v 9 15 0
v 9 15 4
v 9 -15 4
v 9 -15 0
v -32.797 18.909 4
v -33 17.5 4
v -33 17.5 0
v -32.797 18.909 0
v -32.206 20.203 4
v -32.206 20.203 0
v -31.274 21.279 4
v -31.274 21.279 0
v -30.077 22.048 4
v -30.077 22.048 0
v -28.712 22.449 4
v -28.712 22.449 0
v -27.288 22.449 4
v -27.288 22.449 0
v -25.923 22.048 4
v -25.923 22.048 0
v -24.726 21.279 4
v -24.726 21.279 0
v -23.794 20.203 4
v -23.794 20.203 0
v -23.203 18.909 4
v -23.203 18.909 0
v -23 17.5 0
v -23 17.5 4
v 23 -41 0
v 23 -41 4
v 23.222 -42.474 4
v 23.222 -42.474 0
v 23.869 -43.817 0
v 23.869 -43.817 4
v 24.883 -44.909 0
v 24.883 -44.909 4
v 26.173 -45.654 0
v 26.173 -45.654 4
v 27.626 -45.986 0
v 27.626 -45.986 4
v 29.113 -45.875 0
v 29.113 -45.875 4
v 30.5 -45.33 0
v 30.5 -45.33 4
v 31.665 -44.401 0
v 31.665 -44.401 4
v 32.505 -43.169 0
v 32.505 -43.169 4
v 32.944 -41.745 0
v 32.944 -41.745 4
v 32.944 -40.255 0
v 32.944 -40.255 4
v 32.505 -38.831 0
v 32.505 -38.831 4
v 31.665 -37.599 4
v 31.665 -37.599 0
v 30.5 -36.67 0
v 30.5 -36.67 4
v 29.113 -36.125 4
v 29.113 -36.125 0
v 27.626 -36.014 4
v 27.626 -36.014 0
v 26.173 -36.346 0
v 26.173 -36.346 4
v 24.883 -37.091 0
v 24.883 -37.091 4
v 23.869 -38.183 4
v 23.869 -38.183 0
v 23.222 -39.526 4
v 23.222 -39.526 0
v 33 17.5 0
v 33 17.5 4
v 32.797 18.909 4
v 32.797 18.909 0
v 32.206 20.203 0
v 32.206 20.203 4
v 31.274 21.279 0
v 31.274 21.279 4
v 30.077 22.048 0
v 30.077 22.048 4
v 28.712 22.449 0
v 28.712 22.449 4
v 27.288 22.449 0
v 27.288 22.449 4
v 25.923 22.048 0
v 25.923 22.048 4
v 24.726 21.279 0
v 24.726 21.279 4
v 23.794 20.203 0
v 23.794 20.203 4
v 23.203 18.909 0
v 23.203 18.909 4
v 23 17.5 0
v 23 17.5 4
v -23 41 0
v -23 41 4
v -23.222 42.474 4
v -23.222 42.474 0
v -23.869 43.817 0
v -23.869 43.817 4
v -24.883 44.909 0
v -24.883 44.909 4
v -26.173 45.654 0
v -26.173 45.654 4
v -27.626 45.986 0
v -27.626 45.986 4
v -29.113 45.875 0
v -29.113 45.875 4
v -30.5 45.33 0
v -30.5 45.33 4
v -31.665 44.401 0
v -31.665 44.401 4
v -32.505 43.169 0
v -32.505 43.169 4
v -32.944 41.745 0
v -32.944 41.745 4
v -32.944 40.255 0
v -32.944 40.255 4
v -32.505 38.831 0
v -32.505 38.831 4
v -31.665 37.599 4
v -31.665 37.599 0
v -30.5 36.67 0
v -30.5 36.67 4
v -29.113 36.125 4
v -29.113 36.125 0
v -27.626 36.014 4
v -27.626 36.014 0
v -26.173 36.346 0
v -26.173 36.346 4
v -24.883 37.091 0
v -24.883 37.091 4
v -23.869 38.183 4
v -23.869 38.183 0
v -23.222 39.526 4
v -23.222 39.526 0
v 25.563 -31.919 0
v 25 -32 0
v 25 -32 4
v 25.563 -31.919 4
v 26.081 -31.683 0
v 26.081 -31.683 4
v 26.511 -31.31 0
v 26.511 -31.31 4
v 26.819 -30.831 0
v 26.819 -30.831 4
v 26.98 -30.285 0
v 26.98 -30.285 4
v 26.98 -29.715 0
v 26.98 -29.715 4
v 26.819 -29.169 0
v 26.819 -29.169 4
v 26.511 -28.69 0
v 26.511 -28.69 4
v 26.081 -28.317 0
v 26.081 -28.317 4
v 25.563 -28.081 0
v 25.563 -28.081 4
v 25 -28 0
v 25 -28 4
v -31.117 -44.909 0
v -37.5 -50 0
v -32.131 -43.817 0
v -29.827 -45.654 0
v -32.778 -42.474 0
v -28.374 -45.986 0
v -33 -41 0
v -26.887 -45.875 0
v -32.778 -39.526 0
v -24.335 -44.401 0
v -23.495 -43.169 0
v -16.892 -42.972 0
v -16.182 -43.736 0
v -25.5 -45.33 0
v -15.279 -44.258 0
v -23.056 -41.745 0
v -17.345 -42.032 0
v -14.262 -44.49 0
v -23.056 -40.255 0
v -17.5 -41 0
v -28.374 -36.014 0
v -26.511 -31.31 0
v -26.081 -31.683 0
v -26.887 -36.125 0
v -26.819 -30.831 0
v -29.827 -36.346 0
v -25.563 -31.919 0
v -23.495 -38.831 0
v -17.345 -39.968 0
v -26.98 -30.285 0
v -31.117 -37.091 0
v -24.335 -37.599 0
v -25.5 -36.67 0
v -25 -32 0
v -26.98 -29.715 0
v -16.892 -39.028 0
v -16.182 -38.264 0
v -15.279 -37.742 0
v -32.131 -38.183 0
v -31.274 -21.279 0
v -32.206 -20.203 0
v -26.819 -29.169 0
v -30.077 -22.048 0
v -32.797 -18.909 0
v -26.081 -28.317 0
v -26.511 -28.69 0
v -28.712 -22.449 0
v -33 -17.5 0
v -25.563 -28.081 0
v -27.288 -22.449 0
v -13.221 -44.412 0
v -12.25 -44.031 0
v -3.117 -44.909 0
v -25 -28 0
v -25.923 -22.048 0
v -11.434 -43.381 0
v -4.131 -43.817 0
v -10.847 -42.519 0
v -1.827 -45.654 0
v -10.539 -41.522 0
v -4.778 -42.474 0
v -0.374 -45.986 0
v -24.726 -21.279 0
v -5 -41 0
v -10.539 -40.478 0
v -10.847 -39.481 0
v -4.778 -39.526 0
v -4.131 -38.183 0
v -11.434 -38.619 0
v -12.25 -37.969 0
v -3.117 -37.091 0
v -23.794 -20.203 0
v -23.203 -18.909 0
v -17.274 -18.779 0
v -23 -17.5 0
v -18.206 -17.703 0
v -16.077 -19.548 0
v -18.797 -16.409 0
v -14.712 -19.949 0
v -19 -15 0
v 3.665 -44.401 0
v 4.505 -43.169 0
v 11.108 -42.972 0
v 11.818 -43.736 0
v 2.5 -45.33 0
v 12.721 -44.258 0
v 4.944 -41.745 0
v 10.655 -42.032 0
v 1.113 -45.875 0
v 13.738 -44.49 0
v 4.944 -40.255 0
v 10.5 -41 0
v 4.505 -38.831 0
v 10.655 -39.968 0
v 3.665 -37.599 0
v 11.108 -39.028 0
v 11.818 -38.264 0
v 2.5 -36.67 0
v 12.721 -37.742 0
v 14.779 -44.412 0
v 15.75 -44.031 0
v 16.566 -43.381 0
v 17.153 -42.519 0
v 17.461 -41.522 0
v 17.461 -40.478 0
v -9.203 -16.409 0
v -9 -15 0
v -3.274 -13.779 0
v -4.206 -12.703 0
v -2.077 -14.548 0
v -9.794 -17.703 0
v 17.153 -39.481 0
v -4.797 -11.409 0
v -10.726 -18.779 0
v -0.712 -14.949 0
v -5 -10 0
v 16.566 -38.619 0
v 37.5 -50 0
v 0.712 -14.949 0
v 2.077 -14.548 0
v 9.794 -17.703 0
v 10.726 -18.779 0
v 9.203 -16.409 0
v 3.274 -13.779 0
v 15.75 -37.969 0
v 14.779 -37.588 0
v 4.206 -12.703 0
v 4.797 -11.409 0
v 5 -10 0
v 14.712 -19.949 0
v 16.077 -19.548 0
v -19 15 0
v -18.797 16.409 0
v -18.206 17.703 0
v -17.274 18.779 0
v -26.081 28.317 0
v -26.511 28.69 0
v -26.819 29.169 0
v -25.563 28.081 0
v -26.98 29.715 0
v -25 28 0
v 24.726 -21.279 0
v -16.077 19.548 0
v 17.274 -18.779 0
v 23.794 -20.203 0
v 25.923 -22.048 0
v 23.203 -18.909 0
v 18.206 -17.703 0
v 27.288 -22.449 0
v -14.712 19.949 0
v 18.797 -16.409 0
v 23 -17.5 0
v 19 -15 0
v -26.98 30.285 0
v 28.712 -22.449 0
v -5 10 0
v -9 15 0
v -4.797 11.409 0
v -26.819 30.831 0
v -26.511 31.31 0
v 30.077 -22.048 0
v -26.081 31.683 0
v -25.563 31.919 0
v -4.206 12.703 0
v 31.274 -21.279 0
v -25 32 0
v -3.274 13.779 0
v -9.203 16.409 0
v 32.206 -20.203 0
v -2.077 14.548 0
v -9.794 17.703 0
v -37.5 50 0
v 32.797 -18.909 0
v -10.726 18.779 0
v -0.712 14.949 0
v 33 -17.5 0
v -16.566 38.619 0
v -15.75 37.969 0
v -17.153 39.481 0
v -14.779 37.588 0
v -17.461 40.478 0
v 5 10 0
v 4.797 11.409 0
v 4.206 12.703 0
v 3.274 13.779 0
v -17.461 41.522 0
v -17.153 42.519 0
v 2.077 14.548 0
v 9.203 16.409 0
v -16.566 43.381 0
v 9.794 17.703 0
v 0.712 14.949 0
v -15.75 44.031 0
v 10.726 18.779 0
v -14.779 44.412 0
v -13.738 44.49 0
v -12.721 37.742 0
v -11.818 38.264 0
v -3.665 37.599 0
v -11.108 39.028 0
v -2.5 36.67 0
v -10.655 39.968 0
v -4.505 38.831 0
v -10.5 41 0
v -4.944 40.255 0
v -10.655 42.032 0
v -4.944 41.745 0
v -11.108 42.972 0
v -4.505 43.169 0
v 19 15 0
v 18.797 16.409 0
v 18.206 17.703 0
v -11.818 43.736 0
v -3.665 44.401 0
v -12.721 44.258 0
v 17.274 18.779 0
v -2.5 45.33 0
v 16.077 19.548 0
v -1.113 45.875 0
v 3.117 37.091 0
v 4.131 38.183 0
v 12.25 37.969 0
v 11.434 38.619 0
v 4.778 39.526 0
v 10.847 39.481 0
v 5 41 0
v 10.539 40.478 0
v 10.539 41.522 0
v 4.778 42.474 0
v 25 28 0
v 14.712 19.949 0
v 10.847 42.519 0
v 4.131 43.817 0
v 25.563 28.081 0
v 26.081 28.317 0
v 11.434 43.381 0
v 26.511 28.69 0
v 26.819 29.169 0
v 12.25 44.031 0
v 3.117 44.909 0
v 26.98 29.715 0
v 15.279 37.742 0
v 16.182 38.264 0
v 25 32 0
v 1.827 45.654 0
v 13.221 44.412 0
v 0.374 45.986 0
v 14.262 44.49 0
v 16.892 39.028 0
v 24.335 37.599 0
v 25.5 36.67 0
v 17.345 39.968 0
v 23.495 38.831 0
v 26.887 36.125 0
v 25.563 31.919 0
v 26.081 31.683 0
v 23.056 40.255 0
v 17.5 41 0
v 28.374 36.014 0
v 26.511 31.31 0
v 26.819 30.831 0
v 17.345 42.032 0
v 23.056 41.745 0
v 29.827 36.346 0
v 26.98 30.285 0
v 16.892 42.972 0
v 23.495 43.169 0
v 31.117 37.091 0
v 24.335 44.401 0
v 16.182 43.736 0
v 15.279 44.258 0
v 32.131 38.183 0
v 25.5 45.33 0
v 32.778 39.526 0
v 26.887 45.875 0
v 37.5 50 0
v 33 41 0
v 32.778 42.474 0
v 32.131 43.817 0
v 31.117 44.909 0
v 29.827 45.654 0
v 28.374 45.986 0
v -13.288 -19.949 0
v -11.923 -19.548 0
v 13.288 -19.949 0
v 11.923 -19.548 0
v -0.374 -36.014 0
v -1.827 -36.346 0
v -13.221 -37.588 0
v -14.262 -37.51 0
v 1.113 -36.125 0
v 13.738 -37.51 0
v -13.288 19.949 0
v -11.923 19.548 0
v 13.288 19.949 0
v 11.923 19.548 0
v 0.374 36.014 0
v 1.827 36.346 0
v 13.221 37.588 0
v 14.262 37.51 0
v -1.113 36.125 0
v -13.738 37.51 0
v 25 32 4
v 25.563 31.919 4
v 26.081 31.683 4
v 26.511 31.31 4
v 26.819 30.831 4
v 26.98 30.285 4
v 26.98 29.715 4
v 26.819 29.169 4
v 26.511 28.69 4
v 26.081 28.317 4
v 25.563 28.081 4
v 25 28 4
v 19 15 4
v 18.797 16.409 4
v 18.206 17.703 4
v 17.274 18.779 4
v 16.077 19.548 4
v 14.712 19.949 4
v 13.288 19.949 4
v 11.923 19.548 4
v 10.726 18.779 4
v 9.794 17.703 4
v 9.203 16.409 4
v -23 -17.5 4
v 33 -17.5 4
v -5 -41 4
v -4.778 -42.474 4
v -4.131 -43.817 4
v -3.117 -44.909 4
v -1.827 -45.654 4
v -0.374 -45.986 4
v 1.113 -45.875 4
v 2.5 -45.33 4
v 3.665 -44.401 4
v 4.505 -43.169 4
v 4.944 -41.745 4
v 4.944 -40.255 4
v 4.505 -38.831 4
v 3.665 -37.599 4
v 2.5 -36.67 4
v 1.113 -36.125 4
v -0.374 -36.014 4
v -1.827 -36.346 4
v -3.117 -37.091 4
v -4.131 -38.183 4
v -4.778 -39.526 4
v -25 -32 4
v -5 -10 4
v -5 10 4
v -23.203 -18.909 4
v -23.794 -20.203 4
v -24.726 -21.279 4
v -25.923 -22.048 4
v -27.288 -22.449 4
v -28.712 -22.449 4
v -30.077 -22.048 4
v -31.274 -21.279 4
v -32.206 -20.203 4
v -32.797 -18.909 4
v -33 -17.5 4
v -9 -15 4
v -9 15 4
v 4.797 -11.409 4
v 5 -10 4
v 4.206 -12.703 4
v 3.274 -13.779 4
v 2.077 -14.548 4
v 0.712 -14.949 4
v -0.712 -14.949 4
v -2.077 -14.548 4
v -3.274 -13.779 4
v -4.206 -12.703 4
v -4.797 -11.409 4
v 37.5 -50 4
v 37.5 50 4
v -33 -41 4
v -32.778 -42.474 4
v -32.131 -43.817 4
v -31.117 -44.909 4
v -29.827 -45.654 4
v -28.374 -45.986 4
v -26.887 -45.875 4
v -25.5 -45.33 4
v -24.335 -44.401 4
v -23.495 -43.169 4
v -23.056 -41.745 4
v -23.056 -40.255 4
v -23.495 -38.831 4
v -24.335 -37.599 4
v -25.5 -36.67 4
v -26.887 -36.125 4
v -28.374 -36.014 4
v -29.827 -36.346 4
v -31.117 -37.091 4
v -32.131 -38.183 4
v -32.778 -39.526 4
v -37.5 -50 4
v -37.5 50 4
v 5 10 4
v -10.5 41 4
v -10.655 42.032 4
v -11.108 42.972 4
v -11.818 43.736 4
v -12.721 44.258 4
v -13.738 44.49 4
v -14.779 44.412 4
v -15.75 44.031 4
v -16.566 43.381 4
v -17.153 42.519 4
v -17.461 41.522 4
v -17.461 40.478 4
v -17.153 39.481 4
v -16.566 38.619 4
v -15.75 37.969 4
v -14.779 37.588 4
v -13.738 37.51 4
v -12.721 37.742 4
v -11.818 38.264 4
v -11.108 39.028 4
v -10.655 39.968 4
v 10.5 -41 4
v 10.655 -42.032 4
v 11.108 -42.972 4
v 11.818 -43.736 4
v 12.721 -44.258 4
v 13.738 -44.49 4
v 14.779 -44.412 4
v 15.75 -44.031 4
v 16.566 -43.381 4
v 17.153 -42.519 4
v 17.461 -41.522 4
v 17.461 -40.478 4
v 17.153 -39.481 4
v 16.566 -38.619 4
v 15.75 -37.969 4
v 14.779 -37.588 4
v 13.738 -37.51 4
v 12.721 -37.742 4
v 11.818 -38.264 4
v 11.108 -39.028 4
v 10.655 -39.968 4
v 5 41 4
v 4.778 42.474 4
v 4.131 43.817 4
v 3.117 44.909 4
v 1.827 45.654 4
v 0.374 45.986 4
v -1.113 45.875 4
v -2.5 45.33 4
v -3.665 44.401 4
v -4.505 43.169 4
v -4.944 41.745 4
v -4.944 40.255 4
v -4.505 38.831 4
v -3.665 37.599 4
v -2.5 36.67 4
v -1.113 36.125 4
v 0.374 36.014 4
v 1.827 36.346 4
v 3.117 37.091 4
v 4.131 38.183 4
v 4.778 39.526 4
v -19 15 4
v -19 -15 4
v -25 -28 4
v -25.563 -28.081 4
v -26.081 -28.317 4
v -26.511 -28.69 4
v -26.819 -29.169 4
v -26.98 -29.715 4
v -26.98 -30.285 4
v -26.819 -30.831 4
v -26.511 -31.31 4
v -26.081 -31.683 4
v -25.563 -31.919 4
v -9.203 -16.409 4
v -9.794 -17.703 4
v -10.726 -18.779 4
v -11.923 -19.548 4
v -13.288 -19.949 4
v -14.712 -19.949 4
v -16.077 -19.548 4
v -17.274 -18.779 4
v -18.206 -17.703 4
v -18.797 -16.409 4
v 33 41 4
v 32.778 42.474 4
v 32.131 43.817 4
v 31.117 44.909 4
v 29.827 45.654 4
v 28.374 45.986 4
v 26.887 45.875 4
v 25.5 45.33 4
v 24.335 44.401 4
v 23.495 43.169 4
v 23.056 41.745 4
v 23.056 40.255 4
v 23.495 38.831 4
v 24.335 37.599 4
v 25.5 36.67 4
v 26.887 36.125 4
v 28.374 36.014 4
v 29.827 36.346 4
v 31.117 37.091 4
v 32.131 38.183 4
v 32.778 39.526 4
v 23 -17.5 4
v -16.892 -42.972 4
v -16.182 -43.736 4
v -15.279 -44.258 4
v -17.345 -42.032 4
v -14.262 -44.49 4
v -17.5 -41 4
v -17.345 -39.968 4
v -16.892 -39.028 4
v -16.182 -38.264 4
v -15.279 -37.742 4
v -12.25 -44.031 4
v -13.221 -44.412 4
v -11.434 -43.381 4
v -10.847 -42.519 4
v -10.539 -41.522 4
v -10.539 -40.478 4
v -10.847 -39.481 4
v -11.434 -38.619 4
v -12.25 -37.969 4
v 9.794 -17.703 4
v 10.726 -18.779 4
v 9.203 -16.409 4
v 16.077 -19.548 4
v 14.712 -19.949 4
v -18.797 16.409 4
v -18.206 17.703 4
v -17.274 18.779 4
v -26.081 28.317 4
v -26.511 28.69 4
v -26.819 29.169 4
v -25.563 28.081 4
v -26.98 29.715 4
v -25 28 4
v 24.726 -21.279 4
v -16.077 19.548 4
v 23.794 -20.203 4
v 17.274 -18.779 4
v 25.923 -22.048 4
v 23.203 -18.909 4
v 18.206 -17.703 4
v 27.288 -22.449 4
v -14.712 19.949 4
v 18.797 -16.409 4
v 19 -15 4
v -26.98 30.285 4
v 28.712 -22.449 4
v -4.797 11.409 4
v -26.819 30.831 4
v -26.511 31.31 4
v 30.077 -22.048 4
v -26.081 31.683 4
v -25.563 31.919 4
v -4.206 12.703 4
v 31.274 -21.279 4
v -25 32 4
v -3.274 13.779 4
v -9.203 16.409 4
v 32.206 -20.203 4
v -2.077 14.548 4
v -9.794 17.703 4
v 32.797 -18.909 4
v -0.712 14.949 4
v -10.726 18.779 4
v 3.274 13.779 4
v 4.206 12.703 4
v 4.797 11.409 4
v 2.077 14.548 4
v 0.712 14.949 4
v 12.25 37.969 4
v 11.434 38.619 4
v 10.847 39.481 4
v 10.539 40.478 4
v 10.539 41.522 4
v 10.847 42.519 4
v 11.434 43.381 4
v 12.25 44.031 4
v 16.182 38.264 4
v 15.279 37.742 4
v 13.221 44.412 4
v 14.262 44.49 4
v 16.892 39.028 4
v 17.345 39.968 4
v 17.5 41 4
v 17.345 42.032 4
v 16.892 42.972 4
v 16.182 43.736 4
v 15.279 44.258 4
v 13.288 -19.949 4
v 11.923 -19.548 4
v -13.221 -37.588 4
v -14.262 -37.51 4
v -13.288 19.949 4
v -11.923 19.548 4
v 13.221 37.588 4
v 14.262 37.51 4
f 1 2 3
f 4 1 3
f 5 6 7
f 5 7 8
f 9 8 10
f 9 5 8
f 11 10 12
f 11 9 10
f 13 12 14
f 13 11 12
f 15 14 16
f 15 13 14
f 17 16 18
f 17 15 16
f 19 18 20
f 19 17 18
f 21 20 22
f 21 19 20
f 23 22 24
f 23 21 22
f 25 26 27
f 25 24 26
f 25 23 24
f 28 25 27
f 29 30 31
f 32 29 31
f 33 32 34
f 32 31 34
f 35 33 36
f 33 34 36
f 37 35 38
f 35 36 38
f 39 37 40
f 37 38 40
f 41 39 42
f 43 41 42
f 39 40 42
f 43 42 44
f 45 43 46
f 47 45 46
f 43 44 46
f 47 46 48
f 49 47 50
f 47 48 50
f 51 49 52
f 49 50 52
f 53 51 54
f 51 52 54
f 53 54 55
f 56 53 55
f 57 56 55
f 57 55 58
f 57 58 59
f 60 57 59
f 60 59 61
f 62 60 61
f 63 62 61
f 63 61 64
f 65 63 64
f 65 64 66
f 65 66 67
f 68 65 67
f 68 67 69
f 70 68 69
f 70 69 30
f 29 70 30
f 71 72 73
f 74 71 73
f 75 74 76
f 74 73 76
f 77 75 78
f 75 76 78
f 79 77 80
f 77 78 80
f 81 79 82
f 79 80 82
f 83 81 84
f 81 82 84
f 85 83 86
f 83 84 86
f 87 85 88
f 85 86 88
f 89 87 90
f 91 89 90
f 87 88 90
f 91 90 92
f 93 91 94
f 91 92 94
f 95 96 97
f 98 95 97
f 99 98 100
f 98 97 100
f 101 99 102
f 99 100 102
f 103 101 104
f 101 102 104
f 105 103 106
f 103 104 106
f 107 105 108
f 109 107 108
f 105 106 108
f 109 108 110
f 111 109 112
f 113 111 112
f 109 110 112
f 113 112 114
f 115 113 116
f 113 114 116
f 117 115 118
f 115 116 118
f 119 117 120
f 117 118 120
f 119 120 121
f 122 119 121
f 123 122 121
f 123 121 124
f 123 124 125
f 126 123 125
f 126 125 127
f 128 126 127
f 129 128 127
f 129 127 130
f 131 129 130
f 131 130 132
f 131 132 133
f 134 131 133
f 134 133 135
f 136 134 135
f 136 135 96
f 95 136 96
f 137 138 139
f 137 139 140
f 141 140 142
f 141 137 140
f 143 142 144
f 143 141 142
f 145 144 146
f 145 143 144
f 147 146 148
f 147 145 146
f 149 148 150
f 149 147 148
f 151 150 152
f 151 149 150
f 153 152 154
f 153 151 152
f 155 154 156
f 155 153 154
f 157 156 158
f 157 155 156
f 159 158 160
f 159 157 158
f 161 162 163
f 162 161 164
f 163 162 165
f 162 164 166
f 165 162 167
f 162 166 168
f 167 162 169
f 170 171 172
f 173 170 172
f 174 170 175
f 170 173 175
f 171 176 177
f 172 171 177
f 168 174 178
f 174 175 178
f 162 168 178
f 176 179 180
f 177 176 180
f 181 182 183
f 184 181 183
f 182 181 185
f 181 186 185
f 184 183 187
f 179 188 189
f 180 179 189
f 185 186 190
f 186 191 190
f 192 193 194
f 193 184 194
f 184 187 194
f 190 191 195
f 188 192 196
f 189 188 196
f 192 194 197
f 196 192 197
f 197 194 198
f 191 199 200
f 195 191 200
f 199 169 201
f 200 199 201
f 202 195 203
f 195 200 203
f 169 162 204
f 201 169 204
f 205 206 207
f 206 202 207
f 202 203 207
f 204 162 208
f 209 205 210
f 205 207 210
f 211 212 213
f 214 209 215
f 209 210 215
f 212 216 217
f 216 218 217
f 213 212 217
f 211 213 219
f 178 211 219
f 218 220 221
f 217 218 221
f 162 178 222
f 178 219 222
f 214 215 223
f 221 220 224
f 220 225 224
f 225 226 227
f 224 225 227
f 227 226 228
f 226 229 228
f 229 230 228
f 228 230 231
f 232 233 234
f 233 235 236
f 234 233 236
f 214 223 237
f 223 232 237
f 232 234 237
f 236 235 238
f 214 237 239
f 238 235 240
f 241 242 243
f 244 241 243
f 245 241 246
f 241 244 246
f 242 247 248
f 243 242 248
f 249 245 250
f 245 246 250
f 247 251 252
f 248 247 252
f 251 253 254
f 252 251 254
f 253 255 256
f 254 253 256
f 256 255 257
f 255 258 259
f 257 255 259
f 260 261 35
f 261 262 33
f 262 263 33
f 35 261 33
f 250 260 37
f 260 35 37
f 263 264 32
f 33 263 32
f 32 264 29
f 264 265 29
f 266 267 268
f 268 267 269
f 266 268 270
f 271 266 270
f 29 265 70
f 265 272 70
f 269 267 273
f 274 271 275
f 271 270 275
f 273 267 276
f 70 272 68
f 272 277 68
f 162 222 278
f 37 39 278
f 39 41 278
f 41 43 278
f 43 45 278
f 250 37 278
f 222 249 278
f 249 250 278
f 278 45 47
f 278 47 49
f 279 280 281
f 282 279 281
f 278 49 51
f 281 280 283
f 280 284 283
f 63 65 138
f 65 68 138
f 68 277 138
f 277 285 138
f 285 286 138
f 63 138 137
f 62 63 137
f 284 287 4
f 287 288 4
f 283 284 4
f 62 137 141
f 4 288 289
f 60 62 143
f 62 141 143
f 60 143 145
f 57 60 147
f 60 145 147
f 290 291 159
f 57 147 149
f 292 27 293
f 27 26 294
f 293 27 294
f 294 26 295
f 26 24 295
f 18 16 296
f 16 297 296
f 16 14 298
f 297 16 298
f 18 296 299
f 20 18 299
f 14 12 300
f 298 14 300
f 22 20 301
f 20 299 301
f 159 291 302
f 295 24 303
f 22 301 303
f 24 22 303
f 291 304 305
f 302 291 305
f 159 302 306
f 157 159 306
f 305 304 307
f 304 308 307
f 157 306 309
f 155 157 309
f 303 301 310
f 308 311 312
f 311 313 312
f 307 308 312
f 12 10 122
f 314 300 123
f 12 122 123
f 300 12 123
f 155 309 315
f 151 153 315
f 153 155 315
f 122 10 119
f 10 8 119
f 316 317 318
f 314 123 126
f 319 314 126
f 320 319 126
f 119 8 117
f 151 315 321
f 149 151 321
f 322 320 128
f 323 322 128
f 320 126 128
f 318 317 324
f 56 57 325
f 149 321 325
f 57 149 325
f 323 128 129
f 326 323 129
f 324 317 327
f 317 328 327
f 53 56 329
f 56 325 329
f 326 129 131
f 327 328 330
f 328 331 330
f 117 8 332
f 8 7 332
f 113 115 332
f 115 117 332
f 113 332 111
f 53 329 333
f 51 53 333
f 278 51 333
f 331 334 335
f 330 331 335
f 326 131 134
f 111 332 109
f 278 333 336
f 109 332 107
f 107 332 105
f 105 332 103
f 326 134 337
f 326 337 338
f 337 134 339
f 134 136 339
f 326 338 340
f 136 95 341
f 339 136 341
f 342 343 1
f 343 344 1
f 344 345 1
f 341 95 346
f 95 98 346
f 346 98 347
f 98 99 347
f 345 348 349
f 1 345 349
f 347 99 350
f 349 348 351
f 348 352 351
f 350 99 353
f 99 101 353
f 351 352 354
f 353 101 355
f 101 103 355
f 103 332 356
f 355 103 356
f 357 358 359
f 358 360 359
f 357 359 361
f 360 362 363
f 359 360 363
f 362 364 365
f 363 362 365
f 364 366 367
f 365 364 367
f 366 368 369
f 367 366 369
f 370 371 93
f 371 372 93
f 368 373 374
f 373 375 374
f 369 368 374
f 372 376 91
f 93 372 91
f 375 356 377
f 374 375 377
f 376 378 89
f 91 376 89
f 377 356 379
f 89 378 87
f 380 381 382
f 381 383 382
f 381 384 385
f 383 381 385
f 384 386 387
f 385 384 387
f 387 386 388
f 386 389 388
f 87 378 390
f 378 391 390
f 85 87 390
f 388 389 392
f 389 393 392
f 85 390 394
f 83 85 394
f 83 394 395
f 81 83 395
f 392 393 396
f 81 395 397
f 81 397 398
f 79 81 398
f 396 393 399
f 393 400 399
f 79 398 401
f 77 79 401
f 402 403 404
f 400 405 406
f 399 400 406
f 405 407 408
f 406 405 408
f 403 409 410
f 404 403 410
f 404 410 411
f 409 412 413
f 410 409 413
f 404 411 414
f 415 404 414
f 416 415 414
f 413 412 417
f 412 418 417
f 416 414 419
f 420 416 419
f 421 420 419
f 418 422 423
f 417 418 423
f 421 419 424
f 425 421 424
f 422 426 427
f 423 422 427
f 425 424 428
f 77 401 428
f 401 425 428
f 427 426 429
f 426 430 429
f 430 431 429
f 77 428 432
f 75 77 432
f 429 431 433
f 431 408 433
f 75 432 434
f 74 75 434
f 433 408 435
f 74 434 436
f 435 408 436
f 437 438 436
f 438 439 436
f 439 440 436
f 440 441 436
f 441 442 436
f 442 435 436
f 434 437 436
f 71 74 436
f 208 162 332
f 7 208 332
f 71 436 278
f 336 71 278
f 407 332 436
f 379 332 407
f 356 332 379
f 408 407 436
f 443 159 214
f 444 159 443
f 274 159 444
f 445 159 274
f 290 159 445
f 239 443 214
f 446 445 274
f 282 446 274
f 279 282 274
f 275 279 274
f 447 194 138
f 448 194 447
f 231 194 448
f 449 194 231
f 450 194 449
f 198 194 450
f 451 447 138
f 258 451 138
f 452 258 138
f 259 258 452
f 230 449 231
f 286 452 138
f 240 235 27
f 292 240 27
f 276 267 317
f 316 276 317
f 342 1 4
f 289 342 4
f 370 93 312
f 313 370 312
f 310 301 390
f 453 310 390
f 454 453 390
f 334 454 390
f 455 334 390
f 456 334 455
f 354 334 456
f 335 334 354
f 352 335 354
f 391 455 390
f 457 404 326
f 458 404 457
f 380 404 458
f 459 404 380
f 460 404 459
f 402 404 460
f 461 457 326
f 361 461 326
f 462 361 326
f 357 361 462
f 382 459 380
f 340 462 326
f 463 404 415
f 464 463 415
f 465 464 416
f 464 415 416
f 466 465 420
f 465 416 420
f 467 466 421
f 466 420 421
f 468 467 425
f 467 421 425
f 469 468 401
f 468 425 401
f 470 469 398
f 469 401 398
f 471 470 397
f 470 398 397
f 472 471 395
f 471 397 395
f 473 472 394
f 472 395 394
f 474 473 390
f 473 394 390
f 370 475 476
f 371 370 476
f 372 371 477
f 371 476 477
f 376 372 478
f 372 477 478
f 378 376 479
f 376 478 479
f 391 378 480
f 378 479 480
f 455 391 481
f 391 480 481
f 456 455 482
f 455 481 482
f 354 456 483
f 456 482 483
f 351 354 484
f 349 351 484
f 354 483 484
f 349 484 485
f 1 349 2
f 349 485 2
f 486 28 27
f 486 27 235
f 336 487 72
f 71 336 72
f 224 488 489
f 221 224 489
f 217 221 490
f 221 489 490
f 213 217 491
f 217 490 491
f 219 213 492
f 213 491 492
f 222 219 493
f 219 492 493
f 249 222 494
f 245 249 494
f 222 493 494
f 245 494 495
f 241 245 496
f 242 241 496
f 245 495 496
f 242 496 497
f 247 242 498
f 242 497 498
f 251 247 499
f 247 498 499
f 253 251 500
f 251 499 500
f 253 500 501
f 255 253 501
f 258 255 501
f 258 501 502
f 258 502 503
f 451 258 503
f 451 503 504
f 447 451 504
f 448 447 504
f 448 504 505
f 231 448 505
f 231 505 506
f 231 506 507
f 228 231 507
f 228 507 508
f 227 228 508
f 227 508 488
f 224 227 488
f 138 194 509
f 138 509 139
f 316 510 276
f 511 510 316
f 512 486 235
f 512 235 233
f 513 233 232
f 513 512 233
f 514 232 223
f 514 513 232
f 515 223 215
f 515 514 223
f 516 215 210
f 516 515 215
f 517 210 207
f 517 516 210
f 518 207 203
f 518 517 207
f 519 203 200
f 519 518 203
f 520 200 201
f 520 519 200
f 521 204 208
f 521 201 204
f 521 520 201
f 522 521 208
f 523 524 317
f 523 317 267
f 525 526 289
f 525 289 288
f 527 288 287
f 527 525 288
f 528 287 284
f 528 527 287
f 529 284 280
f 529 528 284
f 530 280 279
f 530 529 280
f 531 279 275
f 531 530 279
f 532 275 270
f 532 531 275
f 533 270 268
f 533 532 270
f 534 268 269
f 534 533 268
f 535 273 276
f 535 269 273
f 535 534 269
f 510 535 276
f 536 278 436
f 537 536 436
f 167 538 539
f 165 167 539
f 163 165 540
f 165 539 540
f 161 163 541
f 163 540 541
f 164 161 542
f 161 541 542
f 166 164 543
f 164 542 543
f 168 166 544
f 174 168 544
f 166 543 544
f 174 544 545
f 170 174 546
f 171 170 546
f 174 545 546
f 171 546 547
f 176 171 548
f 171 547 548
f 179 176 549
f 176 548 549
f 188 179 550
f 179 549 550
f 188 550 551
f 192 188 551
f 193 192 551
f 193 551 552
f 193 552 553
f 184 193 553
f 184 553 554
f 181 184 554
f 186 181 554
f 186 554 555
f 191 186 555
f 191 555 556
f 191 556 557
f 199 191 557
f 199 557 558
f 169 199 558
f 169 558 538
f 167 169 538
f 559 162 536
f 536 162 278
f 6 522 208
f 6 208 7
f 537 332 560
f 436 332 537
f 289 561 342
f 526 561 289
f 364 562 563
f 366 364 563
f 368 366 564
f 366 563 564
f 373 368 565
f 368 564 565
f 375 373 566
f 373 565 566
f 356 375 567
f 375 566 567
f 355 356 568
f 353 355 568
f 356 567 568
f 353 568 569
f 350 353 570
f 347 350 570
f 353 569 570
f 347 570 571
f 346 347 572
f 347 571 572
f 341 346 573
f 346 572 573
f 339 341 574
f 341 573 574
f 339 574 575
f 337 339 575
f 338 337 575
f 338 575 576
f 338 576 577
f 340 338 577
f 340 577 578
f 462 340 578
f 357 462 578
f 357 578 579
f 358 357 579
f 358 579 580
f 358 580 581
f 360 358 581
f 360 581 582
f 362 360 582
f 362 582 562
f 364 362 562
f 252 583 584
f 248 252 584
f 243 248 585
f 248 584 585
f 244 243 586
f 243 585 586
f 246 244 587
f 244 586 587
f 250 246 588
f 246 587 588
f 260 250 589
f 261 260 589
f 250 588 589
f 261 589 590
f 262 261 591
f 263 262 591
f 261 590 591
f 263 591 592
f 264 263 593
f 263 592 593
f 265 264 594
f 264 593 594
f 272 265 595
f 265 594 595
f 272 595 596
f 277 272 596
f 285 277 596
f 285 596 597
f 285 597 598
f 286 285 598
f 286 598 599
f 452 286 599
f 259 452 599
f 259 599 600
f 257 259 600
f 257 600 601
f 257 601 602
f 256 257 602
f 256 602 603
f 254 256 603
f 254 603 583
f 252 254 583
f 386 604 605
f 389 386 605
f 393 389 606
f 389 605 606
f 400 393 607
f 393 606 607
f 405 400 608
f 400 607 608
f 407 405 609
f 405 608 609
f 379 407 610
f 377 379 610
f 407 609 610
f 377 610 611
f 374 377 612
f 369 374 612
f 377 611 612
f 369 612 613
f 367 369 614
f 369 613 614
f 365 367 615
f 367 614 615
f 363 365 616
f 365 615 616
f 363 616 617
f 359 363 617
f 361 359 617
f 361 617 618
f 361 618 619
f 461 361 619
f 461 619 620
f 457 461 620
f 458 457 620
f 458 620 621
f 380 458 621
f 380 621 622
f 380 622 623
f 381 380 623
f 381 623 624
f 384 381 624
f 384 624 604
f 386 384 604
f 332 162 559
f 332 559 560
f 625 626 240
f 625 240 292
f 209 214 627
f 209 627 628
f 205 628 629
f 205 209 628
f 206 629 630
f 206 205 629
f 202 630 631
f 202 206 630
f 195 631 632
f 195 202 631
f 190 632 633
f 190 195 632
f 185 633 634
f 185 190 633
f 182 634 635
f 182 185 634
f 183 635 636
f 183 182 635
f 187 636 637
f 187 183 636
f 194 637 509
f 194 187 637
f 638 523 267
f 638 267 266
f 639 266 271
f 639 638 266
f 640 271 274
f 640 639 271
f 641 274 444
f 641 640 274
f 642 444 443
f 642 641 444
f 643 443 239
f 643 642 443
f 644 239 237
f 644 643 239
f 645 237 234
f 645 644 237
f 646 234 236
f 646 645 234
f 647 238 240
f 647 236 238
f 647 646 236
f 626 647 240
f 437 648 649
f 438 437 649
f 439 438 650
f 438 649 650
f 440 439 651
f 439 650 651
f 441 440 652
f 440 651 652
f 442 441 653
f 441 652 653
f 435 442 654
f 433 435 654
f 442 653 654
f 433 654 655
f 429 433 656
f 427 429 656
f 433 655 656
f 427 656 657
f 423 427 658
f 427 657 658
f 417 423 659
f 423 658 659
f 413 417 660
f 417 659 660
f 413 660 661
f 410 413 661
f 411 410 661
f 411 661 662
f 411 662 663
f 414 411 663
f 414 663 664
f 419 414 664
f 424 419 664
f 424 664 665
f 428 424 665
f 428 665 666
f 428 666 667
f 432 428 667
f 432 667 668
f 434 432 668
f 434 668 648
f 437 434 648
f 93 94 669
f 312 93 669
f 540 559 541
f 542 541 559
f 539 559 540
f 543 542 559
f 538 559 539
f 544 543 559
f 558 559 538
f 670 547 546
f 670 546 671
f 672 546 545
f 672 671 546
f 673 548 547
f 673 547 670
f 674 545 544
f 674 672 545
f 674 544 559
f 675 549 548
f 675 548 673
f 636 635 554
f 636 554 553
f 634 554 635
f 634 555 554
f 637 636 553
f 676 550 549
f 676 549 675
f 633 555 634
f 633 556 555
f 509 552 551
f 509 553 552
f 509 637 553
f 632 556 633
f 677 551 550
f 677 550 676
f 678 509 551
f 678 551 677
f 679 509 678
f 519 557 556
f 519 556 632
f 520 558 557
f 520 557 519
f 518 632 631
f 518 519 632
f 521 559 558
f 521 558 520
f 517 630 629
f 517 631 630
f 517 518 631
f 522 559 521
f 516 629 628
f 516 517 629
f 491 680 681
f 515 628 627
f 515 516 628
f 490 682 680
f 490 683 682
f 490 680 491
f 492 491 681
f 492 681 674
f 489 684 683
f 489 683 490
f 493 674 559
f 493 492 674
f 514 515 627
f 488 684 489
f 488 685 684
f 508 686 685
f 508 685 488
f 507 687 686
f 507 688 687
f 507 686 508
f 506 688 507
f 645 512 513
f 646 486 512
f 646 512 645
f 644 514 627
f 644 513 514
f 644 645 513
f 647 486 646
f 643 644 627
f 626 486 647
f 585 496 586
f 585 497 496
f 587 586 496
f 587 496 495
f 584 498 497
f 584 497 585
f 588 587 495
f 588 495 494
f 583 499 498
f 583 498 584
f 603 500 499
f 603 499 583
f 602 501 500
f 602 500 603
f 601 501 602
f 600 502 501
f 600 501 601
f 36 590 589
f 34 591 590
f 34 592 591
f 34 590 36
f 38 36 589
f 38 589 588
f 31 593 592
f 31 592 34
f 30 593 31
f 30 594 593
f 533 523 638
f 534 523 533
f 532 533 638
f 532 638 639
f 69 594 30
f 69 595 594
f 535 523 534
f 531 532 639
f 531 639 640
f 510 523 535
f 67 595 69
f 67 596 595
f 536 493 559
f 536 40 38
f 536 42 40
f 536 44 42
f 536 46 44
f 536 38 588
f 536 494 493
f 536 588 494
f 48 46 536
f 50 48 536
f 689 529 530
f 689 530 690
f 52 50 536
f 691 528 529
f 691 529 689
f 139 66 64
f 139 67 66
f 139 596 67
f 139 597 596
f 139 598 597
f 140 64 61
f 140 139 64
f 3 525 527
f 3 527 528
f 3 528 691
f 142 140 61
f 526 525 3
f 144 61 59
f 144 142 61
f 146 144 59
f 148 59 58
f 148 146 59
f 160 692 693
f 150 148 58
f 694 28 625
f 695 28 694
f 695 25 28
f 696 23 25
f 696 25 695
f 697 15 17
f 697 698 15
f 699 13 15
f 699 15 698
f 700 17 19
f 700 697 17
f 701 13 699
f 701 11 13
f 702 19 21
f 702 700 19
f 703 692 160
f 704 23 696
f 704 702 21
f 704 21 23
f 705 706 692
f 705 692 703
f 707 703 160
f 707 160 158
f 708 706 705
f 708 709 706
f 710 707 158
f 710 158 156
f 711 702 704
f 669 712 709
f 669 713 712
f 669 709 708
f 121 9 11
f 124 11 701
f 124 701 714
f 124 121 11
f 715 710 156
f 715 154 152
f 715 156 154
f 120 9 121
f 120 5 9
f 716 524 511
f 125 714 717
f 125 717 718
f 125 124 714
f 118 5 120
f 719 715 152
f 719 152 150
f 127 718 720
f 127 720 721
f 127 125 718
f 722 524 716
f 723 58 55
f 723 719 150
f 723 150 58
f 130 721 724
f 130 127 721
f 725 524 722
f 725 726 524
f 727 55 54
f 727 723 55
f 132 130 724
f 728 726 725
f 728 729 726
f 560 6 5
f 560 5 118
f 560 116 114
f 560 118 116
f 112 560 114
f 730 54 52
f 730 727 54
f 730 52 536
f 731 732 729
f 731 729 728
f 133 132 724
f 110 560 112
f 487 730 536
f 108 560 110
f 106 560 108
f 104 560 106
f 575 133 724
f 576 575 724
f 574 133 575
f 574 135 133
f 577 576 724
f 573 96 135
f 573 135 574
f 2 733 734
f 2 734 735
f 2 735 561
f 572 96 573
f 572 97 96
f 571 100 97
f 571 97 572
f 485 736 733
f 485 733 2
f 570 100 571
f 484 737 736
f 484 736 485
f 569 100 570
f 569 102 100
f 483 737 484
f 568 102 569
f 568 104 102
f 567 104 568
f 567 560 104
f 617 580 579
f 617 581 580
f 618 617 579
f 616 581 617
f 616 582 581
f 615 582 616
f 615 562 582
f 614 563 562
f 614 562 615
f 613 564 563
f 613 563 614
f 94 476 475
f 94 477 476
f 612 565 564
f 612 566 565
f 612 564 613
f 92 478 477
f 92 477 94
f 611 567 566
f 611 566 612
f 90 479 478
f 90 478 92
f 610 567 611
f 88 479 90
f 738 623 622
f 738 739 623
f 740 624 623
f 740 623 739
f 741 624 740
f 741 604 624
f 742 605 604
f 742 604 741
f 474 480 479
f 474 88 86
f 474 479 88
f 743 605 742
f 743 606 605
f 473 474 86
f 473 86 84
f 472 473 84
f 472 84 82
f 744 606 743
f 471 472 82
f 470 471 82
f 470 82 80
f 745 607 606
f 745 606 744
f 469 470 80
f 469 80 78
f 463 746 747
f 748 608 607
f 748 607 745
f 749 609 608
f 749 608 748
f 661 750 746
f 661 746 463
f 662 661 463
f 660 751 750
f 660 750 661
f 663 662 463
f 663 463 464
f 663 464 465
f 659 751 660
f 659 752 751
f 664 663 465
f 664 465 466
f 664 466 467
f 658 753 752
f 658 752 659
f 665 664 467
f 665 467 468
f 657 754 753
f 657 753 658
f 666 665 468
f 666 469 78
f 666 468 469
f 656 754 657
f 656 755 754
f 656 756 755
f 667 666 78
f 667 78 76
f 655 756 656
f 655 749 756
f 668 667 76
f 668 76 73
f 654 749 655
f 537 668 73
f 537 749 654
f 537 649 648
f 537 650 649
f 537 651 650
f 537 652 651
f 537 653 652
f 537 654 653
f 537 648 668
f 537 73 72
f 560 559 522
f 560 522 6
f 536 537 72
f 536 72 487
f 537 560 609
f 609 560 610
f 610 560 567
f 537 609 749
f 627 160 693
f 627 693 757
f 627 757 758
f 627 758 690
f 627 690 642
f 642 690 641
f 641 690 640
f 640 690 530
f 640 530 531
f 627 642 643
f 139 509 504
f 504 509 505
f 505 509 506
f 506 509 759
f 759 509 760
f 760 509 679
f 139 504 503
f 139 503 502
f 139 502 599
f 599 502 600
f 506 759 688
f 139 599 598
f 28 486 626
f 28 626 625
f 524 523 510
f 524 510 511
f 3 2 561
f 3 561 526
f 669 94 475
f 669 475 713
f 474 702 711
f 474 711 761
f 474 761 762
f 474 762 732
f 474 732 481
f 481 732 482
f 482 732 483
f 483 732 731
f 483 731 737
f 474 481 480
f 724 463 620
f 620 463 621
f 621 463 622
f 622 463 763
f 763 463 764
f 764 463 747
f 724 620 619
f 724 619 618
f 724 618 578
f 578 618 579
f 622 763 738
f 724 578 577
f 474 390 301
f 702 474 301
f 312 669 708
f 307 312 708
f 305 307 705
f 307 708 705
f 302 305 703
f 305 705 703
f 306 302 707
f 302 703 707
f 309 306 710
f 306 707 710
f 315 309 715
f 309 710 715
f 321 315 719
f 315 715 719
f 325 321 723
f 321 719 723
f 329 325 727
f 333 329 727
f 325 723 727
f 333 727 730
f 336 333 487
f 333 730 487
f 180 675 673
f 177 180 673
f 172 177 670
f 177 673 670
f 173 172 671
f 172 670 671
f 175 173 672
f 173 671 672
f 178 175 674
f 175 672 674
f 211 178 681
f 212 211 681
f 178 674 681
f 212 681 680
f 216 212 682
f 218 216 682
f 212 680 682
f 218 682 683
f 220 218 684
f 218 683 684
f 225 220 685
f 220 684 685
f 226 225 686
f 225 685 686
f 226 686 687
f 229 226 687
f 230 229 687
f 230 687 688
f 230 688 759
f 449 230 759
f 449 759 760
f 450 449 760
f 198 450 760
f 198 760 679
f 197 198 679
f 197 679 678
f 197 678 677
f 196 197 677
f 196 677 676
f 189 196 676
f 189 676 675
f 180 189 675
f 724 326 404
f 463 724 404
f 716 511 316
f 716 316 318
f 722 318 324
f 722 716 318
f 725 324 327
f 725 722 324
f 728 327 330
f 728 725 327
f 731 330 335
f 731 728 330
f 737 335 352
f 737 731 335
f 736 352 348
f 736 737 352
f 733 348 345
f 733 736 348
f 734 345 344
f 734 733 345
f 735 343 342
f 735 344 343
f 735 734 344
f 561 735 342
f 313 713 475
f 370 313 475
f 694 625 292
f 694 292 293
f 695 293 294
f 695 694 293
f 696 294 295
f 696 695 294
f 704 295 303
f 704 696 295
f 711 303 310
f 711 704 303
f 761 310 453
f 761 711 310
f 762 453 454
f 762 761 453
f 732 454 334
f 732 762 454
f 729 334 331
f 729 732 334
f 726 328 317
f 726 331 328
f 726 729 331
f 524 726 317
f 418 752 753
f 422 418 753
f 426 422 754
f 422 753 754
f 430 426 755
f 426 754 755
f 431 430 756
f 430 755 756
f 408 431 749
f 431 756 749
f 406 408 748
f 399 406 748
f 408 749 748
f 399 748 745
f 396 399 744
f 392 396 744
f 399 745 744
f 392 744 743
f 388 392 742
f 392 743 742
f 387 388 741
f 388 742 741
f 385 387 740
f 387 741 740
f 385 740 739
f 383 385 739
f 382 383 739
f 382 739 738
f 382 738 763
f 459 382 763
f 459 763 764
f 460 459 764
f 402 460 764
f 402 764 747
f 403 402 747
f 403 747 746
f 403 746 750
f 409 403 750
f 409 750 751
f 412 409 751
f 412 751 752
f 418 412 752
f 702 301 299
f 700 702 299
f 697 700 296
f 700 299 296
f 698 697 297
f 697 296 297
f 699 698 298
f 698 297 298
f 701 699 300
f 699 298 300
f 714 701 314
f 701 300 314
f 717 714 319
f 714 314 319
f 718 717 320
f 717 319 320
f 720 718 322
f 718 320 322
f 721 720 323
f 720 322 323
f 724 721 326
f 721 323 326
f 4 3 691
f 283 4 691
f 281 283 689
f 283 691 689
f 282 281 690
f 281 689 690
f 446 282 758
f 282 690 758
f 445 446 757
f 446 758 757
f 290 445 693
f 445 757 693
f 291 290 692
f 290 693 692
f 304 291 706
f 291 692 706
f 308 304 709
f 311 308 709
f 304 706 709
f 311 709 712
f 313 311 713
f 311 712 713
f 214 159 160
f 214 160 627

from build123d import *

# Parameters (mm, degrees)
SKIZZE1_W                       = 75
SKIZZE1_H                       = 100
GRUNDPLATTE_DEPTH               = 4
SKIZZE2_R                       = 5
SKIZZE2_R_2                     = 3.5
SCHNITT_LINEAR_AUSTRAGEN1_DEPTH = 63.627869196


with BuildPart() as part:
    # Skizze1 → Grundplatte (new body)
    with BuildSketch(Plane.XY):
        Rectangle(SKIZZE1_W, SKIZZE1_H)
        with BuildLine():
            Line((25, 28), (-25, 28))
            ThreePointArc((-25, 28), (-27, 30), (-25, 32))
            Line((-25, 32), (25, 32))
            ThreePointArc((25, 32), (27, 30), (25, 28))
        make_face(mode=Mode.SUBTRACT)
        with BuildLine():
            Line((25, -28), (-25, -28))
            ThreePointArc((-25, -28), (-27, -30), (-25, -32))
            Line((-25, -32), (25, -32))
            ThreePointArc((25, -32), (27, -30), (25, -28))
        make_face(mode=Mode.SUBTRACT)
    extrude(amount=GRUNDPLATTE_DEPTH)

    # Skizze2 → Schnitt-Linear austragen1 (cut, through all)
    with BuildSketch(Plane.XY.offset(4)):
        with Locations((-28, 41)):
            Circle(SKIZZE2_R)
        with Locations((0, 41)):
            Circle(SKIZZE2_R)
        with Locations((28, 41)):
            Circle(SKIZZE2_R)
        with Locations((-14, 41)):
            Circle(SKIZZE2_R_2)
        with Locations((14, 41)):
            Circle(SKIZZE2_R_2)
        with Locations(Location((14, -41, 0), (0, 0, 180))):
            Circle(SKIZZE2_R_2)
        with Locations(Location((-14, -41, 0), (0, 0, 180))):
            Circle(SKIZZE2_R_2)
        with Locations(Location((28, -41, 0), (0, 0, 180))):
            Circle(SKIZZE2_R)
        with Locations(Location((0, -41, 0), (0, 0, 180))):
            Circle(SKIZZE2_R)
        with Locations(Location((-28, -41, 0), (0, 0, 180))):
            Circle(SKIZZE2_R)
        with BuildLine():
            Line((-33, -17.5), (-33, 17.5))
            ThreePointArc((-33, 17.5), (-28, 22.5), (-23, 17.5))
            Line((-23, 17.5), (-23, -17.5))
            ThreePointArc((-23, -17.5), (-28, -22.5), (-33, -17.5))
        make_face()
        with BuildLine():
            Line((5, 10), (5, -10))
            ThreePointArc((5, -10), (0, -15), (-5, -10))
            Line((-5, -10), (-5, 10))
            ThreePointArc((-5, 10), (0, 15), (5, 10))
        make_face()
        with BuildLine():
            Line((-9, 15), (-9, -15))
            ThreePointArc((-9, -15), (-14, -20), (-19, -15))
            Line((-19, -15), (-19, 15))
            ThreePointArc((-19, 15), (-14, 20), (-9, 15))
        make_face()
        with BuildLine():
            Line((9, 15), (9, -15))
            ThreePointArc((9, -15), (14, -20), (19, -15))
            Line((19, -15), (19, 15))
            ThreePointArc((19, 15), (14, 20), (9, 15))
        make_face()
        with BuildLine():
            Line((33, -17.5), (33, 17.5))
            ThreePointArc((33, 17.5), (28, 22.5), (23, 17.5))
            Line((23, 17.5), (23, -17.5))
            ThreePointArc((23, -17.5), (28, -22.5), (33, -17.5))
        make_face()
    extrude(amount=-SCHNITT_LINEAR_AUSTRAGEN1_DEPTH, mode=Mode.SUBTRACT)


solid = part.part
